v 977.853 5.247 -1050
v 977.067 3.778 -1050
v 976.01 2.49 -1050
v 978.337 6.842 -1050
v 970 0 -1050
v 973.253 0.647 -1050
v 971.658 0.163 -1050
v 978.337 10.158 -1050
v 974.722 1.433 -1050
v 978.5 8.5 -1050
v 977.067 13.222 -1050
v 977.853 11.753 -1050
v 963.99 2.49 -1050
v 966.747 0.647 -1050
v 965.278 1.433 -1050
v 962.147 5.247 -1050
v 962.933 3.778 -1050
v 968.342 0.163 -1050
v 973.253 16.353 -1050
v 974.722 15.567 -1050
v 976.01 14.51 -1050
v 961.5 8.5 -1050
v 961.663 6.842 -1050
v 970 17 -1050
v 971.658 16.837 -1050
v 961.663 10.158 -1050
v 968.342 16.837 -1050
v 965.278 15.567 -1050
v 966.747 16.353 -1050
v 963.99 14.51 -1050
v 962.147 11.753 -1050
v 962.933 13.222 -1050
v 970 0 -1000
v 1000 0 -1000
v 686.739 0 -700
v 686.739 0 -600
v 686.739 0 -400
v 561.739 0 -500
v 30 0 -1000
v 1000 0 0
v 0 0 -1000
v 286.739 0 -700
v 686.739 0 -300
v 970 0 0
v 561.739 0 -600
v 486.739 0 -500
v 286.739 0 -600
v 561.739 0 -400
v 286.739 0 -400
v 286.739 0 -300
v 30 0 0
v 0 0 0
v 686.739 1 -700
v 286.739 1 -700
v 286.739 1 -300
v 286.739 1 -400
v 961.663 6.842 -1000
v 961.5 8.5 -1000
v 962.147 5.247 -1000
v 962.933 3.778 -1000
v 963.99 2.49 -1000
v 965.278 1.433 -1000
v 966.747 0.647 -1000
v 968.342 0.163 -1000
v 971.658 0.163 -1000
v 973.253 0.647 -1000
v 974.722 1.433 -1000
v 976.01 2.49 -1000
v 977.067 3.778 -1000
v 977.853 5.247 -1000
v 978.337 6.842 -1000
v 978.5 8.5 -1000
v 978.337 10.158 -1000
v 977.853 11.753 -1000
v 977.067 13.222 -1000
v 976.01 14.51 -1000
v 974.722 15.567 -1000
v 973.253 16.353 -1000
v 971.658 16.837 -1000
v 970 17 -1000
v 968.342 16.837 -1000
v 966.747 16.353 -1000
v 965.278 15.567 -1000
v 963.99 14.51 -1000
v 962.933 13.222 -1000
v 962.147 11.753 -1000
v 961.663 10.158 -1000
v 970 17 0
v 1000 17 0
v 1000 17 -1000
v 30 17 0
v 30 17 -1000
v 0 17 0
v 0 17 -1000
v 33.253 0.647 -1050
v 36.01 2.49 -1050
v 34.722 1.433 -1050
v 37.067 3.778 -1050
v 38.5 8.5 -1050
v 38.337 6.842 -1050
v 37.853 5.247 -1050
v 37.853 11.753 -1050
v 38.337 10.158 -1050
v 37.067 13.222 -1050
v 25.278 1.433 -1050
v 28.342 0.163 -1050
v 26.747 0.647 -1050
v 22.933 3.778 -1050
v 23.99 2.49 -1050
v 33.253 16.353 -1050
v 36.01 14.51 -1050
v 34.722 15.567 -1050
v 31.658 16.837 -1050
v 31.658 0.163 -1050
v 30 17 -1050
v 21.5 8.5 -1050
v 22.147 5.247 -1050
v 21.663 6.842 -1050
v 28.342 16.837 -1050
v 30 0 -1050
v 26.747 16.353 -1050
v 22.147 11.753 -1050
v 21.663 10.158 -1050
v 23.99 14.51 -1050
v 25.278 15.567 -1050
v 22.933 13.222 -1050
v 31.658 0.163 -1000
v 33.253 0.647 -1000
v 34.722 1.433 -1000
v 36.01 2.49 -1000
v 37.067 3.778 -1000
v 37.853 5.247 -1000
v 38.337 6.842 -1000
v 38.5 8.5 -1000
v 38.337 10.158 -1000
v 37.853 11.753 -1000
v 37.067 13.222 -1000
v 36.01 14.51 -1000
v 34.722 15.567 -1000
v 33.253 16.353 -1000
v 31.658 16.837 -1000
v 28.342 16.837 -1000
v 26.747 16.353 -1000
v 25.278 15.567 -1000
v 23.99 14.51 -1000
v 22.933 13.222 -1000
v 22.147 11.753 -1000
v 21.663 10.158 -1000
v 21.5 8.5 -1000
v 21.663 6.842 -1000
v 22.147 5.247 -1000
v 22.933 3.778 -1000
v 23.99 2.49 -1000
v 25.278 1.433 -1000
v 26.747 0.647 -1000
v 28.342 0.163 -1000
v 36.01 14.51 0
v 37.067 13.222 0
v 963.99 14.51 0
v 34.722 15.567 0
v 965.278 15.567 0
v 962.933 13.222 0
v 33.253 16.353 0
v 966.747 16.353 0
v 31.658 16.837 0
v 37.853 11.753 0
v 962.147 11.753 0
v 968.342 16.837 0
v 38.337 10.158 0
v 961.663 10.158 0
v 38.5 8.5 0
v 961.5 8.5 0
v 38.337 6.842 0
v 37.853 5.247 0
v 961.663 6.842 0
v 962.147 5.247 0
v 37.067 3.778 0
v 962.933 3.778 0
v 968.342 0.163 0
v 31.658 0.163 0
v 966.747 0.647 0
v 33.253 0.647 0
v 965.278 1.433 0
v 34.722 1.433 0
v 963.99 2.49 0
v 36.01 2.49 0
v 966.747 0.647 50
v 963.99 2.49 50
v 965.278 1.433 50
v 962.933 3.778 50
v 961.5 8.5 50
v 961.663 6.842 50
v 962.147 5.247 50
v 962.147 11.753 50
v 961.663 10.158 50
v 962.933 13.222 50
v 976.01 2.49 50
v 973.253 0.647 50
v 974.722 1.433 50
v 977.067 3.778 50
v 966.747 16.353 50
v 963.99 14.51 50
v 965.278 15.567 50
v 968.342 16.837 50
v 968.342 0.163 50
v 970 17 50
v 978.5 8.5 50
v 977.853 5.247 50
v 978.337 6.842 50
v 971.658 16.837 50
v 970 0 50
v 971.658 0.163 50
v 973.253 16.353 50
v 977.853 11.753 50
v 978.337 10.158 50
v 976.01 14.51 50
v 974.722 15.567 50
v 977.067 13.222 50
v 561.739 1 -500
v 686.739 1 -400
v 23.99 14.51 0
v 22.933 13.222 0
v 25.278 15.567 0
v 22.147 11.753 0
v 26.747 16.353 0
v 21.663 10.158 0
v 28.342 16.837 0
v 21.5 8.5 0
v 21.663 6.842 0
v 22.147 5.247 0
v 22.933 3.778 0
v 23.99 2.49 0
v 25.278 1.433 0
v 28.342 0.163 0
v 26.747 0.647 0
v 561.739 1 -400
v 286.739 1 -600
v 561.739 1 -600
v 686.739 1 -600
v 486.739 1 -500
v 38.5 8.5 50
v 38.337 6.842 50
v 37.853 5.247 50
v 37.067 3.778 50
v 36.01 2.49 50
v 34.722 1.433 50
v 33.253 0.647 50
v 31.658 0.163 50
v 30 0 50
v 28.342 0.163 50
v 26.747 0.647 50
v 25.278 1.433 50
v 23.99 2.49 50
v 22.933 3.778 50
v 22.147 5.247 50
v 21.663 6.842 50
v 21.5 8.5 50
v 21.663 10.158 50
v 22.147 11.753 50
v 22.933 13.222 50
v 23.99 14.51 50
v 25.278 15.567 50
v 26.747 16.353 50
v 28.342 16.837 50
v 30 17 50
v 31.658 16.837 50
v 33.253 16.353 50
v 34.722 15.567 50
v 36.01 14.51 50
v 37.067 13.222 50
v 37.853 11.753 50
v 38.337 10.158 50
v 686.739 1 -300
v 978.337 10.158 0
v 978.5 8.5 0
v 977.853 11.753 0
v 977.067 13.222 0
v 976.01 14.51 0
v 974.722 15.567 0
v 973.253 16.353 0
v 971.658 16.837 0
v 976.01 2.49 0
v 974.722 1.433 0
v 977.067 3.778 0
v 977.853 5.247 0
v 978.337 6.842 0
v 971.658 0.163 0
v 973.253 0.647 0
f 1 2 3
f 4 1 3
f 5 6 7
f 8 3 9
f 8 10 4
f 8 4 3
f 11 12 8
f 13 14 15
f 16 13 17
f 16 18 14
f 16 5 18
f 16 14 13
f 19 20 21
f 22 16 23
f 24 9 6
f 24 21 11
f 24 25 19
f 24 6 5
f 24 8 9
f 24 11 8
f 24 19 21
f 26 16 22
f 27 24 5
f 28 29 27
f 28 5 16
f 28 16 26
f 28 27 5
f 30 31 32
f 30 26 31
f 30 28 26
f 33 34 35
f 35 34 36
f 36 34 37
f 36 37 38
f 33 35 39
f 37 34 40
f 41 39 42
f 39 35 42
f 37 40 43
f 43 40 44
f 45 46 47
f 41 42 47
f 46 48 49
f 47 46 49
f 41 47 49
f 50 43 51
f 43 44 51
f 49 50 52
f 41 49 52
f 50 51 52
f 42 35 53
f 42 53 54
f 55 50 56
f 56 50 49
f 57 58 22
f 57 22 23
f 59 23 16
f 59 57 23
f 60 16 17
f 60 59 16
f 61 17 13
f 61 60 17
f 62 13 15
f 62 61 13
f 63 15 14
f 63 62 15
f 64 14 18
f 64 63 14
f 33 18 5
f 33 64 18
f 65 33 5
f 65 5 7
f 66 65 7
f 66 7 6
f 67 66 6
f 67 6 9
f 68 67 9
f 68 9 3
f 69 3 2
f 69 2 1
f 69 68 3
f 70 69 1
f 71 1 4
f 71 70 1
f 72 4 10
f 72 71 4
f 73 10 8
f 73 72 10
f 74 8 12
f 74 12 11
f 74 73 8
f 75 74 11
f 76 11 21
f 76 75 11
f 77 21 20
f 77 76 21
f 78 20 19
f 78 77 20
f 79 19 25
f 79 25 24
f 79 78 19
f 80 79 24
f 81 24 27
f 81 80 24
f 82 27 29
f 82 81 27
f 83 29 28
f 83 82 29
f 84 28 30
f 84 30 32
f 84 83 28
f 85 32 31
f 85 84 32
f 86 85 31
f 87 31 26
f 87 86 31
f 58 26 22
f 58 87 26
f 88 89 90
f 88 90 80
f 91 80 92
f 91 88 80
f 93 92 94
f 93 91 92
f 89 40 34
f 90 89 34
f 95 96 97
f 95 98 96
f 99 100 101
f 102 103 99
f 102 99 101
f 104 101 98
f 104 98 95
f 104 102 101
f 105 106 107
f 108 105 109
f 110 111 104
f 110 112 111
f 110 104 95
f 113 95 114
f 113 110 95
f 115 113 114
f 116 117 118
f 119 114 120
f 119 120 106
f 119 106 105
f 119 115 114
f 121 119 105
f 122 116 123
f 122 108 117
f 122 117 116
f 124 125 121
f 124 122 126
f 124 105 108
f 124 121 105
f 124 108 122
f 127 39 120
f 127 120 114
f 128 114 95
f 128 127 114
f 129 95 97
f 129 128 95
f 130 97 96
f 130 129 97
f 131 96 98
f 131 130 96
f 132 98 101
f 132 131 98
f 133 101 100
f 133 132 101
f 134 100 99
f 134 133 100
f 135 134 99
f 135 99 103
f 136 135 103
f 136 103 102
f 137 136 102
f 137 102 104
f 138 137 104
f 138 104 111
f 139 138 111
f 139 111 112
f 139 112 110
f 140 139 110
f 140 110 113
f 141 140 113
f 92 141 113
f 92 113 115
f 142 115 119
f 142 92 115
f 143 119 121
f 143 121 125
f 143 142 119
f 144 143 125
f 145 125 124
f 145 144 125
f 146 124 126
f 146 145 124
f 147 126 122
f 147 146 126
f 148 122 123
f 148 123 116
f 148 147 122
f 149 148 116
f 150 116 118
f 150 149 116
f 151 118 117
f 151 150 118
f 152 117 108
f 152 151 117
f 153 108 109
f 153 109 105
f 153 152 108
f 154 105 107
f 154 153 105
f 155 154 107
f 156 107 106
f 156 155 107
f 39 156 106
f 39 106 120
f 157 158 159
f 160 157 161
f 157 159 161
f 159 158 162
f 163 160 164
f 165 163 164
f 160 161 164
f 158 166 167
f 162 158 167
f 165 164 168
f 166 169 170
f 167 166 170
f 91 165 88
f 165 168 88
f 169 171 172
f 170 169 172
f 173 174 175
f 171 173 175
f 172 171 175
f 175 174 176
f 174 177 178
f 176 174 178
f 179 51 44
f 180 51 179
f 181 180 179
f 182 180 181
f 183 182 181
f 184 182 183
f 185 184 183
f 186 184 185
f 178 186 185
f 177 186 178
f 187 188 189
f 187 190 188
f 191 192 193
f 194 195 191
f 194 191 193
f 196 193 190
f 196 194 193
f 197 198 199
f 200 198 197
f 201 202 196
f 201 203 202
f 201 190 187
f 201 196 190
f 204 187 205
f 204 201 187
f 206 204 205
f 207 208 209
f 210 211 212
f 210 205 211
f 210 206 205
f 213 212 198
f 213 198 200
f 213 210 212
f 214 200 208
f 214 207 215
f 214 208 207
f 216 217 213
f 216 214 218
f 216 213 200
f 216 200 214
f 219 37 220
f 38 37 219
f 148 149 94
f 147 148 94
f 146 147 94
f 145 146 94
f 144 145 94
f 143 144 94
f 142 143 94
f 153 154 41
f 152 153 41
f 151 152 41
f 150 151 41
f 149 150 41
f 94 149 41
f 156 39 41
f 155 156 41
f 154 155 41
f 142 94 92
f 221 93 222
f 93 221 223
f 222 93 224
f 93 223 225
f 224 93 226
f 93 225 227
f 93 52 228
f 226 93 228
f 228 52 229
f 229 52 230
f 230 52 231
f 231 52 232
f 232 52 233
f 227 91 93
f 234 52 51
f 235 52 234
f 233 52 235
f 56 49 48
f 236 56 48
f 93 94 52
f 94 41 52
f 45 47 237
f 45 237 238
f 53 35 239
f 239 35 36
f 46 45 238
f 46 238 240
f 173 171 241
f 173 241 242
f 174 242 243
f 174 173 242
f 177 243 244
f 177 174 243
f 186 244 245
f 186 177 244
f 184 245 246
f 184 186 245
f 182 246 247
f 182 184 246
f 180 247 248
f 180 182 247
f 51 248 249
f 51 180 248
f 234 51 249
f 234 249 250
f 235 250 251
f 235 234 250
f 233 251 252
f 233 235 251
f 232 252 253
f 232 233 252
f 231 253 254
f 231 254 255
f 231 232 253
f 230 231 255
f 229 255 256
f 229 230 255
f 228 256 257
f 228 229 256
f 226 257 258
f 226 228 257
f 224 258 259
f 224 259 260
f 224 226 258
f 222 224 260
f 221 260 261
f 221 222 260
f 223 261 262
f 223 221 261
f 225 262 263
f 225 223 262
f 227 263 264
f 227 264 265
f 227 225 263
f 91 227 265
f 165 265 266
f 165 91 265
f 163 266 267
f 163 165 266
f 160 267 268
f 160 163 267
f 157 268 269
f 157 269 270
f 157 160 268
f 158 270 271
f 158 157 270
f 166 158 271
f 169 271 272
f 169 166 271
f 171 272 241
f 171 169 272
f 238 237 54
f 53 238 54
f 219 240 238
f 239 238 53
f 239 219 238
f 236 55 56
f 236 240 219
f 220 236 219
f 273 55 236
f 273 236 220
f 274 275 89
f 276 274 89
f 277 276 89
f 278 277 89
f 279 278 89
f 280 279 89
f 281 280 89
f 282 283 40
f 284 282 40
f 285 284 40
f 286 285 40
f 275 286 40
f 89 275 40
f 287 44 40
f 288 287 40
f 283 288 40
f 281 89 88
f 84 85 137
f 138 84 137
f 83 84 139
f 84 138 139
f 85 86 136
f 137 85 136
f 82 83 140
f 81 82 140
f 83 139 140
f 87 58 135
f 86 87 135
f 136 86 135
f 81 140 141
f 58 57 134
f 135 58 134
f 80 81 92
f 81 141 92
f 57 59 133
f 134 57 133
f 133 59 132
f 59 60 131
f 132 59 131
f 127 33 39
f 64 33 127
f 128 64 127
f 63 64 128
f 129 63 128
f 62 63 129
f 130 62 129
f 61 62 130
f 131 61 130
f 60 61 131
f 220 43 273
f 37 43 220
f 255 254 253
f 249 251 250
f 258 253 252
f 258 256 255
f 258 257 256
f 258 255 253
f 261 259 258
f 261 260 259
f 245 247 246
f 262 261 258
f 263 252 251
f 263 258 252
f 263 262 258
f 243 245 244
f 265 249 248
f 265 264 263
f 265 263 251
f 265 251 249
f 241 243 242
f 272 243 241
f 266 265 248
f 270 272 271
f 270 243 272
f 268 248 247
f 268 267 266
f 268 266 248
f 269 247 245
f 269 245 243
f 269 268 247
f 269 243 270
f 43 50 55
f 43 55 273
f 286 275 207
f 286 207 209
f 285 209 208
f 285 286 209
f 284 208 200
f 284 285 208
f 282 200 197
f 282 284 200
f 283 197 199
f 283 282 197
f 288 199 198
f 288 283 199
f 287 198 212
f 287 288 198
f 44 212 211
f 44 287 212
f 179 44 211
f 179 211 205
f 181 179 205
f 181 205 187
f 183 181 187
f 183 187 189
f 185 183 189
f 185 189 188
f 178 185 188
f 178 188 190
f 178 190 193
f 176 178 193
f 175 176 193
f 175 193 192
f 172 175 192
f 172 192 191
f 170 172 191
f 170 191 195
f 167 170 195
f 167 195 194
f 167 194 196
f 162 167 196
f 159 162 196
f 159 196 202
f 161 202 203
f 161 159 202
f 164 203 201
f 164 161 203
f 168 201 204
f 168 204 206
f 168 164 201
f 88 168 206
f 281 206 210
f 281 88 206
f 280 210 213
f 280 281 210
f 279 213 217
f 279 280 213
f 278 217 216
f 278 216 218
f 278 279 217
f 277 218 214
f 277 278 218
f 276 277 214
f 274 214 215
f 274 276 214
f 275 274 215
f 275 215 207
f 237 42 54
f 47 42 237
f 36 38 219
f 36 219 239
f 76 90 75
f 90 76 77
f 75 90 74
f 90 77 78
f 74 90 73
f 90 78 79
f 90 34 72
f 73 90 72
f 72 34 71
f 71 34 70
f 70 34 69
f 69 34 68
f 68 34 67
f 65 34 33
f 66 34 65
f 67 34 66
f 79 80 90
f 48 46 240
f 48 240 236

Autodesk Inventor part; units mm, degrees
ref_plane "YZ Plane" through (0, 0, 0) normal (1, 0, 0) x (0, 1, 0)
ref_plane "XZ Plane" through (0, 0, 0) normal (0, 1, 0) x (-1, 0, 0)
ref_plane "XY Plane" through (0, 0, 0) normal (0, 0, 1) x (1, 0, 0)
sketch "Boceto1" plane through (0, 0, 0) normal (0, 1, 0) x (-1, 0, 0)
  line L0 (0, 0) -> (-1000, 0)
  line L1 (-1000, 0) -> (-1000, -1000)
  line L2 (-1000, -1000) -> (0, -1000)
  line L3 (0, -1000) -> (0, 0)
  dimension "d0" = 1000
  dimension "d1" = 1000
extrude "Extrusión1" add sketch "Boceto1" along normal blind 17
sketch "Boceto2" plane through (0, 0, 0) normal (0, -1, 0) x (1, 0, 0)
  line L0 (286.7389, -300) -> (686.7389, -300)
  line L1 (0, 0) -> (1000, 0) projected
  line L2 (686.7389, -700) -> (286.7389, -700)
  line L3 (1000, -1000) -> (0, -1000) projected
  line L4 (686.7389, -300) -> (686.7389, -400)
  line L5 (286.7389, -300) -> (286.7389, -300)
  line L6 (286.7389, -300) -> (286.7389, -400)
  line L7 (286.7389, -700) -> (286.7389, -600)
  line L8 (686.7389, -700) -> (686.7389, -600)
  line L9 (286.7389, -400) -> (561.7389, -400)
  line L10 (286.7389, -600) -> (561.7389, -600)
  line L11 (561.7389, -600) -> (486.7389, -500)
  line L12 (486.7389, -500) -> (561.7389, -400)
  line L13 (686.7389, -400) -> (561.7389, -500)
  line L14 (561.7389, -500) -> (686.7389, -600)
  dimension "d4" = 300
  dimension "d5" = 300
  dimension "d6" = 100
  dimension "d7" = 100
  dimension "d8" = 100
  dimension "d9" = 100
  dimension "d10" = 200
  dimension "d11" = 400
  dimension "d12" = 400
  dimension "d13" = 275
extrude "Extrusión2" cut sketch "Boceto2" against normal blind 1
sketch "Boceto3" plane through (0, 0, 0) normal (0, 0, 1) x (1, 0, 0)
  circle A0 centre (30, 8.5) radius 8.5
  line L0 (0, 0) -> (1000, 0) projected
  circle A1 centre (970, 8.5) radius 8.5
  line L1 (0, 0) -> (0, 17) projected
  line L2 (1000, 0) -> (1000, 17) projected
  dimension "d17" = 17
  dimension "d18" = 17
  dimension "d21" = 30
  dimension "d22" = 30
extrude "Extrusión3" add sketch "Boceto3" along normal blind 50
sketch "Boceto5" plane through (1000, 0, -1000) normal (0, 0, -1) x (-1, 0, 0)
  circle A0 centre (30, 8.5) radius 8.5 projected
  circle A1 centre (30, 8.5) radius 8.5
  line L0 (0, 0) -> (0, 17) projected
  arc A2 (970, 0) -> (970, 17) centre (970, 8.5) ccw projected
  circle A3 centre (970, 8.5) radius 8.5
  line L1 (1000, 0) -> (1000, 17) projected
  line L2 (0, 0) -> (1000, 0) projected
  dimension "d23" = 30
  dimension "d24" = 30
extrude "Extrusión4" add sketch "Boceto5" along normal blind 50
properties part number "01_10_Plataforma" material "Acero ASTM A36"
